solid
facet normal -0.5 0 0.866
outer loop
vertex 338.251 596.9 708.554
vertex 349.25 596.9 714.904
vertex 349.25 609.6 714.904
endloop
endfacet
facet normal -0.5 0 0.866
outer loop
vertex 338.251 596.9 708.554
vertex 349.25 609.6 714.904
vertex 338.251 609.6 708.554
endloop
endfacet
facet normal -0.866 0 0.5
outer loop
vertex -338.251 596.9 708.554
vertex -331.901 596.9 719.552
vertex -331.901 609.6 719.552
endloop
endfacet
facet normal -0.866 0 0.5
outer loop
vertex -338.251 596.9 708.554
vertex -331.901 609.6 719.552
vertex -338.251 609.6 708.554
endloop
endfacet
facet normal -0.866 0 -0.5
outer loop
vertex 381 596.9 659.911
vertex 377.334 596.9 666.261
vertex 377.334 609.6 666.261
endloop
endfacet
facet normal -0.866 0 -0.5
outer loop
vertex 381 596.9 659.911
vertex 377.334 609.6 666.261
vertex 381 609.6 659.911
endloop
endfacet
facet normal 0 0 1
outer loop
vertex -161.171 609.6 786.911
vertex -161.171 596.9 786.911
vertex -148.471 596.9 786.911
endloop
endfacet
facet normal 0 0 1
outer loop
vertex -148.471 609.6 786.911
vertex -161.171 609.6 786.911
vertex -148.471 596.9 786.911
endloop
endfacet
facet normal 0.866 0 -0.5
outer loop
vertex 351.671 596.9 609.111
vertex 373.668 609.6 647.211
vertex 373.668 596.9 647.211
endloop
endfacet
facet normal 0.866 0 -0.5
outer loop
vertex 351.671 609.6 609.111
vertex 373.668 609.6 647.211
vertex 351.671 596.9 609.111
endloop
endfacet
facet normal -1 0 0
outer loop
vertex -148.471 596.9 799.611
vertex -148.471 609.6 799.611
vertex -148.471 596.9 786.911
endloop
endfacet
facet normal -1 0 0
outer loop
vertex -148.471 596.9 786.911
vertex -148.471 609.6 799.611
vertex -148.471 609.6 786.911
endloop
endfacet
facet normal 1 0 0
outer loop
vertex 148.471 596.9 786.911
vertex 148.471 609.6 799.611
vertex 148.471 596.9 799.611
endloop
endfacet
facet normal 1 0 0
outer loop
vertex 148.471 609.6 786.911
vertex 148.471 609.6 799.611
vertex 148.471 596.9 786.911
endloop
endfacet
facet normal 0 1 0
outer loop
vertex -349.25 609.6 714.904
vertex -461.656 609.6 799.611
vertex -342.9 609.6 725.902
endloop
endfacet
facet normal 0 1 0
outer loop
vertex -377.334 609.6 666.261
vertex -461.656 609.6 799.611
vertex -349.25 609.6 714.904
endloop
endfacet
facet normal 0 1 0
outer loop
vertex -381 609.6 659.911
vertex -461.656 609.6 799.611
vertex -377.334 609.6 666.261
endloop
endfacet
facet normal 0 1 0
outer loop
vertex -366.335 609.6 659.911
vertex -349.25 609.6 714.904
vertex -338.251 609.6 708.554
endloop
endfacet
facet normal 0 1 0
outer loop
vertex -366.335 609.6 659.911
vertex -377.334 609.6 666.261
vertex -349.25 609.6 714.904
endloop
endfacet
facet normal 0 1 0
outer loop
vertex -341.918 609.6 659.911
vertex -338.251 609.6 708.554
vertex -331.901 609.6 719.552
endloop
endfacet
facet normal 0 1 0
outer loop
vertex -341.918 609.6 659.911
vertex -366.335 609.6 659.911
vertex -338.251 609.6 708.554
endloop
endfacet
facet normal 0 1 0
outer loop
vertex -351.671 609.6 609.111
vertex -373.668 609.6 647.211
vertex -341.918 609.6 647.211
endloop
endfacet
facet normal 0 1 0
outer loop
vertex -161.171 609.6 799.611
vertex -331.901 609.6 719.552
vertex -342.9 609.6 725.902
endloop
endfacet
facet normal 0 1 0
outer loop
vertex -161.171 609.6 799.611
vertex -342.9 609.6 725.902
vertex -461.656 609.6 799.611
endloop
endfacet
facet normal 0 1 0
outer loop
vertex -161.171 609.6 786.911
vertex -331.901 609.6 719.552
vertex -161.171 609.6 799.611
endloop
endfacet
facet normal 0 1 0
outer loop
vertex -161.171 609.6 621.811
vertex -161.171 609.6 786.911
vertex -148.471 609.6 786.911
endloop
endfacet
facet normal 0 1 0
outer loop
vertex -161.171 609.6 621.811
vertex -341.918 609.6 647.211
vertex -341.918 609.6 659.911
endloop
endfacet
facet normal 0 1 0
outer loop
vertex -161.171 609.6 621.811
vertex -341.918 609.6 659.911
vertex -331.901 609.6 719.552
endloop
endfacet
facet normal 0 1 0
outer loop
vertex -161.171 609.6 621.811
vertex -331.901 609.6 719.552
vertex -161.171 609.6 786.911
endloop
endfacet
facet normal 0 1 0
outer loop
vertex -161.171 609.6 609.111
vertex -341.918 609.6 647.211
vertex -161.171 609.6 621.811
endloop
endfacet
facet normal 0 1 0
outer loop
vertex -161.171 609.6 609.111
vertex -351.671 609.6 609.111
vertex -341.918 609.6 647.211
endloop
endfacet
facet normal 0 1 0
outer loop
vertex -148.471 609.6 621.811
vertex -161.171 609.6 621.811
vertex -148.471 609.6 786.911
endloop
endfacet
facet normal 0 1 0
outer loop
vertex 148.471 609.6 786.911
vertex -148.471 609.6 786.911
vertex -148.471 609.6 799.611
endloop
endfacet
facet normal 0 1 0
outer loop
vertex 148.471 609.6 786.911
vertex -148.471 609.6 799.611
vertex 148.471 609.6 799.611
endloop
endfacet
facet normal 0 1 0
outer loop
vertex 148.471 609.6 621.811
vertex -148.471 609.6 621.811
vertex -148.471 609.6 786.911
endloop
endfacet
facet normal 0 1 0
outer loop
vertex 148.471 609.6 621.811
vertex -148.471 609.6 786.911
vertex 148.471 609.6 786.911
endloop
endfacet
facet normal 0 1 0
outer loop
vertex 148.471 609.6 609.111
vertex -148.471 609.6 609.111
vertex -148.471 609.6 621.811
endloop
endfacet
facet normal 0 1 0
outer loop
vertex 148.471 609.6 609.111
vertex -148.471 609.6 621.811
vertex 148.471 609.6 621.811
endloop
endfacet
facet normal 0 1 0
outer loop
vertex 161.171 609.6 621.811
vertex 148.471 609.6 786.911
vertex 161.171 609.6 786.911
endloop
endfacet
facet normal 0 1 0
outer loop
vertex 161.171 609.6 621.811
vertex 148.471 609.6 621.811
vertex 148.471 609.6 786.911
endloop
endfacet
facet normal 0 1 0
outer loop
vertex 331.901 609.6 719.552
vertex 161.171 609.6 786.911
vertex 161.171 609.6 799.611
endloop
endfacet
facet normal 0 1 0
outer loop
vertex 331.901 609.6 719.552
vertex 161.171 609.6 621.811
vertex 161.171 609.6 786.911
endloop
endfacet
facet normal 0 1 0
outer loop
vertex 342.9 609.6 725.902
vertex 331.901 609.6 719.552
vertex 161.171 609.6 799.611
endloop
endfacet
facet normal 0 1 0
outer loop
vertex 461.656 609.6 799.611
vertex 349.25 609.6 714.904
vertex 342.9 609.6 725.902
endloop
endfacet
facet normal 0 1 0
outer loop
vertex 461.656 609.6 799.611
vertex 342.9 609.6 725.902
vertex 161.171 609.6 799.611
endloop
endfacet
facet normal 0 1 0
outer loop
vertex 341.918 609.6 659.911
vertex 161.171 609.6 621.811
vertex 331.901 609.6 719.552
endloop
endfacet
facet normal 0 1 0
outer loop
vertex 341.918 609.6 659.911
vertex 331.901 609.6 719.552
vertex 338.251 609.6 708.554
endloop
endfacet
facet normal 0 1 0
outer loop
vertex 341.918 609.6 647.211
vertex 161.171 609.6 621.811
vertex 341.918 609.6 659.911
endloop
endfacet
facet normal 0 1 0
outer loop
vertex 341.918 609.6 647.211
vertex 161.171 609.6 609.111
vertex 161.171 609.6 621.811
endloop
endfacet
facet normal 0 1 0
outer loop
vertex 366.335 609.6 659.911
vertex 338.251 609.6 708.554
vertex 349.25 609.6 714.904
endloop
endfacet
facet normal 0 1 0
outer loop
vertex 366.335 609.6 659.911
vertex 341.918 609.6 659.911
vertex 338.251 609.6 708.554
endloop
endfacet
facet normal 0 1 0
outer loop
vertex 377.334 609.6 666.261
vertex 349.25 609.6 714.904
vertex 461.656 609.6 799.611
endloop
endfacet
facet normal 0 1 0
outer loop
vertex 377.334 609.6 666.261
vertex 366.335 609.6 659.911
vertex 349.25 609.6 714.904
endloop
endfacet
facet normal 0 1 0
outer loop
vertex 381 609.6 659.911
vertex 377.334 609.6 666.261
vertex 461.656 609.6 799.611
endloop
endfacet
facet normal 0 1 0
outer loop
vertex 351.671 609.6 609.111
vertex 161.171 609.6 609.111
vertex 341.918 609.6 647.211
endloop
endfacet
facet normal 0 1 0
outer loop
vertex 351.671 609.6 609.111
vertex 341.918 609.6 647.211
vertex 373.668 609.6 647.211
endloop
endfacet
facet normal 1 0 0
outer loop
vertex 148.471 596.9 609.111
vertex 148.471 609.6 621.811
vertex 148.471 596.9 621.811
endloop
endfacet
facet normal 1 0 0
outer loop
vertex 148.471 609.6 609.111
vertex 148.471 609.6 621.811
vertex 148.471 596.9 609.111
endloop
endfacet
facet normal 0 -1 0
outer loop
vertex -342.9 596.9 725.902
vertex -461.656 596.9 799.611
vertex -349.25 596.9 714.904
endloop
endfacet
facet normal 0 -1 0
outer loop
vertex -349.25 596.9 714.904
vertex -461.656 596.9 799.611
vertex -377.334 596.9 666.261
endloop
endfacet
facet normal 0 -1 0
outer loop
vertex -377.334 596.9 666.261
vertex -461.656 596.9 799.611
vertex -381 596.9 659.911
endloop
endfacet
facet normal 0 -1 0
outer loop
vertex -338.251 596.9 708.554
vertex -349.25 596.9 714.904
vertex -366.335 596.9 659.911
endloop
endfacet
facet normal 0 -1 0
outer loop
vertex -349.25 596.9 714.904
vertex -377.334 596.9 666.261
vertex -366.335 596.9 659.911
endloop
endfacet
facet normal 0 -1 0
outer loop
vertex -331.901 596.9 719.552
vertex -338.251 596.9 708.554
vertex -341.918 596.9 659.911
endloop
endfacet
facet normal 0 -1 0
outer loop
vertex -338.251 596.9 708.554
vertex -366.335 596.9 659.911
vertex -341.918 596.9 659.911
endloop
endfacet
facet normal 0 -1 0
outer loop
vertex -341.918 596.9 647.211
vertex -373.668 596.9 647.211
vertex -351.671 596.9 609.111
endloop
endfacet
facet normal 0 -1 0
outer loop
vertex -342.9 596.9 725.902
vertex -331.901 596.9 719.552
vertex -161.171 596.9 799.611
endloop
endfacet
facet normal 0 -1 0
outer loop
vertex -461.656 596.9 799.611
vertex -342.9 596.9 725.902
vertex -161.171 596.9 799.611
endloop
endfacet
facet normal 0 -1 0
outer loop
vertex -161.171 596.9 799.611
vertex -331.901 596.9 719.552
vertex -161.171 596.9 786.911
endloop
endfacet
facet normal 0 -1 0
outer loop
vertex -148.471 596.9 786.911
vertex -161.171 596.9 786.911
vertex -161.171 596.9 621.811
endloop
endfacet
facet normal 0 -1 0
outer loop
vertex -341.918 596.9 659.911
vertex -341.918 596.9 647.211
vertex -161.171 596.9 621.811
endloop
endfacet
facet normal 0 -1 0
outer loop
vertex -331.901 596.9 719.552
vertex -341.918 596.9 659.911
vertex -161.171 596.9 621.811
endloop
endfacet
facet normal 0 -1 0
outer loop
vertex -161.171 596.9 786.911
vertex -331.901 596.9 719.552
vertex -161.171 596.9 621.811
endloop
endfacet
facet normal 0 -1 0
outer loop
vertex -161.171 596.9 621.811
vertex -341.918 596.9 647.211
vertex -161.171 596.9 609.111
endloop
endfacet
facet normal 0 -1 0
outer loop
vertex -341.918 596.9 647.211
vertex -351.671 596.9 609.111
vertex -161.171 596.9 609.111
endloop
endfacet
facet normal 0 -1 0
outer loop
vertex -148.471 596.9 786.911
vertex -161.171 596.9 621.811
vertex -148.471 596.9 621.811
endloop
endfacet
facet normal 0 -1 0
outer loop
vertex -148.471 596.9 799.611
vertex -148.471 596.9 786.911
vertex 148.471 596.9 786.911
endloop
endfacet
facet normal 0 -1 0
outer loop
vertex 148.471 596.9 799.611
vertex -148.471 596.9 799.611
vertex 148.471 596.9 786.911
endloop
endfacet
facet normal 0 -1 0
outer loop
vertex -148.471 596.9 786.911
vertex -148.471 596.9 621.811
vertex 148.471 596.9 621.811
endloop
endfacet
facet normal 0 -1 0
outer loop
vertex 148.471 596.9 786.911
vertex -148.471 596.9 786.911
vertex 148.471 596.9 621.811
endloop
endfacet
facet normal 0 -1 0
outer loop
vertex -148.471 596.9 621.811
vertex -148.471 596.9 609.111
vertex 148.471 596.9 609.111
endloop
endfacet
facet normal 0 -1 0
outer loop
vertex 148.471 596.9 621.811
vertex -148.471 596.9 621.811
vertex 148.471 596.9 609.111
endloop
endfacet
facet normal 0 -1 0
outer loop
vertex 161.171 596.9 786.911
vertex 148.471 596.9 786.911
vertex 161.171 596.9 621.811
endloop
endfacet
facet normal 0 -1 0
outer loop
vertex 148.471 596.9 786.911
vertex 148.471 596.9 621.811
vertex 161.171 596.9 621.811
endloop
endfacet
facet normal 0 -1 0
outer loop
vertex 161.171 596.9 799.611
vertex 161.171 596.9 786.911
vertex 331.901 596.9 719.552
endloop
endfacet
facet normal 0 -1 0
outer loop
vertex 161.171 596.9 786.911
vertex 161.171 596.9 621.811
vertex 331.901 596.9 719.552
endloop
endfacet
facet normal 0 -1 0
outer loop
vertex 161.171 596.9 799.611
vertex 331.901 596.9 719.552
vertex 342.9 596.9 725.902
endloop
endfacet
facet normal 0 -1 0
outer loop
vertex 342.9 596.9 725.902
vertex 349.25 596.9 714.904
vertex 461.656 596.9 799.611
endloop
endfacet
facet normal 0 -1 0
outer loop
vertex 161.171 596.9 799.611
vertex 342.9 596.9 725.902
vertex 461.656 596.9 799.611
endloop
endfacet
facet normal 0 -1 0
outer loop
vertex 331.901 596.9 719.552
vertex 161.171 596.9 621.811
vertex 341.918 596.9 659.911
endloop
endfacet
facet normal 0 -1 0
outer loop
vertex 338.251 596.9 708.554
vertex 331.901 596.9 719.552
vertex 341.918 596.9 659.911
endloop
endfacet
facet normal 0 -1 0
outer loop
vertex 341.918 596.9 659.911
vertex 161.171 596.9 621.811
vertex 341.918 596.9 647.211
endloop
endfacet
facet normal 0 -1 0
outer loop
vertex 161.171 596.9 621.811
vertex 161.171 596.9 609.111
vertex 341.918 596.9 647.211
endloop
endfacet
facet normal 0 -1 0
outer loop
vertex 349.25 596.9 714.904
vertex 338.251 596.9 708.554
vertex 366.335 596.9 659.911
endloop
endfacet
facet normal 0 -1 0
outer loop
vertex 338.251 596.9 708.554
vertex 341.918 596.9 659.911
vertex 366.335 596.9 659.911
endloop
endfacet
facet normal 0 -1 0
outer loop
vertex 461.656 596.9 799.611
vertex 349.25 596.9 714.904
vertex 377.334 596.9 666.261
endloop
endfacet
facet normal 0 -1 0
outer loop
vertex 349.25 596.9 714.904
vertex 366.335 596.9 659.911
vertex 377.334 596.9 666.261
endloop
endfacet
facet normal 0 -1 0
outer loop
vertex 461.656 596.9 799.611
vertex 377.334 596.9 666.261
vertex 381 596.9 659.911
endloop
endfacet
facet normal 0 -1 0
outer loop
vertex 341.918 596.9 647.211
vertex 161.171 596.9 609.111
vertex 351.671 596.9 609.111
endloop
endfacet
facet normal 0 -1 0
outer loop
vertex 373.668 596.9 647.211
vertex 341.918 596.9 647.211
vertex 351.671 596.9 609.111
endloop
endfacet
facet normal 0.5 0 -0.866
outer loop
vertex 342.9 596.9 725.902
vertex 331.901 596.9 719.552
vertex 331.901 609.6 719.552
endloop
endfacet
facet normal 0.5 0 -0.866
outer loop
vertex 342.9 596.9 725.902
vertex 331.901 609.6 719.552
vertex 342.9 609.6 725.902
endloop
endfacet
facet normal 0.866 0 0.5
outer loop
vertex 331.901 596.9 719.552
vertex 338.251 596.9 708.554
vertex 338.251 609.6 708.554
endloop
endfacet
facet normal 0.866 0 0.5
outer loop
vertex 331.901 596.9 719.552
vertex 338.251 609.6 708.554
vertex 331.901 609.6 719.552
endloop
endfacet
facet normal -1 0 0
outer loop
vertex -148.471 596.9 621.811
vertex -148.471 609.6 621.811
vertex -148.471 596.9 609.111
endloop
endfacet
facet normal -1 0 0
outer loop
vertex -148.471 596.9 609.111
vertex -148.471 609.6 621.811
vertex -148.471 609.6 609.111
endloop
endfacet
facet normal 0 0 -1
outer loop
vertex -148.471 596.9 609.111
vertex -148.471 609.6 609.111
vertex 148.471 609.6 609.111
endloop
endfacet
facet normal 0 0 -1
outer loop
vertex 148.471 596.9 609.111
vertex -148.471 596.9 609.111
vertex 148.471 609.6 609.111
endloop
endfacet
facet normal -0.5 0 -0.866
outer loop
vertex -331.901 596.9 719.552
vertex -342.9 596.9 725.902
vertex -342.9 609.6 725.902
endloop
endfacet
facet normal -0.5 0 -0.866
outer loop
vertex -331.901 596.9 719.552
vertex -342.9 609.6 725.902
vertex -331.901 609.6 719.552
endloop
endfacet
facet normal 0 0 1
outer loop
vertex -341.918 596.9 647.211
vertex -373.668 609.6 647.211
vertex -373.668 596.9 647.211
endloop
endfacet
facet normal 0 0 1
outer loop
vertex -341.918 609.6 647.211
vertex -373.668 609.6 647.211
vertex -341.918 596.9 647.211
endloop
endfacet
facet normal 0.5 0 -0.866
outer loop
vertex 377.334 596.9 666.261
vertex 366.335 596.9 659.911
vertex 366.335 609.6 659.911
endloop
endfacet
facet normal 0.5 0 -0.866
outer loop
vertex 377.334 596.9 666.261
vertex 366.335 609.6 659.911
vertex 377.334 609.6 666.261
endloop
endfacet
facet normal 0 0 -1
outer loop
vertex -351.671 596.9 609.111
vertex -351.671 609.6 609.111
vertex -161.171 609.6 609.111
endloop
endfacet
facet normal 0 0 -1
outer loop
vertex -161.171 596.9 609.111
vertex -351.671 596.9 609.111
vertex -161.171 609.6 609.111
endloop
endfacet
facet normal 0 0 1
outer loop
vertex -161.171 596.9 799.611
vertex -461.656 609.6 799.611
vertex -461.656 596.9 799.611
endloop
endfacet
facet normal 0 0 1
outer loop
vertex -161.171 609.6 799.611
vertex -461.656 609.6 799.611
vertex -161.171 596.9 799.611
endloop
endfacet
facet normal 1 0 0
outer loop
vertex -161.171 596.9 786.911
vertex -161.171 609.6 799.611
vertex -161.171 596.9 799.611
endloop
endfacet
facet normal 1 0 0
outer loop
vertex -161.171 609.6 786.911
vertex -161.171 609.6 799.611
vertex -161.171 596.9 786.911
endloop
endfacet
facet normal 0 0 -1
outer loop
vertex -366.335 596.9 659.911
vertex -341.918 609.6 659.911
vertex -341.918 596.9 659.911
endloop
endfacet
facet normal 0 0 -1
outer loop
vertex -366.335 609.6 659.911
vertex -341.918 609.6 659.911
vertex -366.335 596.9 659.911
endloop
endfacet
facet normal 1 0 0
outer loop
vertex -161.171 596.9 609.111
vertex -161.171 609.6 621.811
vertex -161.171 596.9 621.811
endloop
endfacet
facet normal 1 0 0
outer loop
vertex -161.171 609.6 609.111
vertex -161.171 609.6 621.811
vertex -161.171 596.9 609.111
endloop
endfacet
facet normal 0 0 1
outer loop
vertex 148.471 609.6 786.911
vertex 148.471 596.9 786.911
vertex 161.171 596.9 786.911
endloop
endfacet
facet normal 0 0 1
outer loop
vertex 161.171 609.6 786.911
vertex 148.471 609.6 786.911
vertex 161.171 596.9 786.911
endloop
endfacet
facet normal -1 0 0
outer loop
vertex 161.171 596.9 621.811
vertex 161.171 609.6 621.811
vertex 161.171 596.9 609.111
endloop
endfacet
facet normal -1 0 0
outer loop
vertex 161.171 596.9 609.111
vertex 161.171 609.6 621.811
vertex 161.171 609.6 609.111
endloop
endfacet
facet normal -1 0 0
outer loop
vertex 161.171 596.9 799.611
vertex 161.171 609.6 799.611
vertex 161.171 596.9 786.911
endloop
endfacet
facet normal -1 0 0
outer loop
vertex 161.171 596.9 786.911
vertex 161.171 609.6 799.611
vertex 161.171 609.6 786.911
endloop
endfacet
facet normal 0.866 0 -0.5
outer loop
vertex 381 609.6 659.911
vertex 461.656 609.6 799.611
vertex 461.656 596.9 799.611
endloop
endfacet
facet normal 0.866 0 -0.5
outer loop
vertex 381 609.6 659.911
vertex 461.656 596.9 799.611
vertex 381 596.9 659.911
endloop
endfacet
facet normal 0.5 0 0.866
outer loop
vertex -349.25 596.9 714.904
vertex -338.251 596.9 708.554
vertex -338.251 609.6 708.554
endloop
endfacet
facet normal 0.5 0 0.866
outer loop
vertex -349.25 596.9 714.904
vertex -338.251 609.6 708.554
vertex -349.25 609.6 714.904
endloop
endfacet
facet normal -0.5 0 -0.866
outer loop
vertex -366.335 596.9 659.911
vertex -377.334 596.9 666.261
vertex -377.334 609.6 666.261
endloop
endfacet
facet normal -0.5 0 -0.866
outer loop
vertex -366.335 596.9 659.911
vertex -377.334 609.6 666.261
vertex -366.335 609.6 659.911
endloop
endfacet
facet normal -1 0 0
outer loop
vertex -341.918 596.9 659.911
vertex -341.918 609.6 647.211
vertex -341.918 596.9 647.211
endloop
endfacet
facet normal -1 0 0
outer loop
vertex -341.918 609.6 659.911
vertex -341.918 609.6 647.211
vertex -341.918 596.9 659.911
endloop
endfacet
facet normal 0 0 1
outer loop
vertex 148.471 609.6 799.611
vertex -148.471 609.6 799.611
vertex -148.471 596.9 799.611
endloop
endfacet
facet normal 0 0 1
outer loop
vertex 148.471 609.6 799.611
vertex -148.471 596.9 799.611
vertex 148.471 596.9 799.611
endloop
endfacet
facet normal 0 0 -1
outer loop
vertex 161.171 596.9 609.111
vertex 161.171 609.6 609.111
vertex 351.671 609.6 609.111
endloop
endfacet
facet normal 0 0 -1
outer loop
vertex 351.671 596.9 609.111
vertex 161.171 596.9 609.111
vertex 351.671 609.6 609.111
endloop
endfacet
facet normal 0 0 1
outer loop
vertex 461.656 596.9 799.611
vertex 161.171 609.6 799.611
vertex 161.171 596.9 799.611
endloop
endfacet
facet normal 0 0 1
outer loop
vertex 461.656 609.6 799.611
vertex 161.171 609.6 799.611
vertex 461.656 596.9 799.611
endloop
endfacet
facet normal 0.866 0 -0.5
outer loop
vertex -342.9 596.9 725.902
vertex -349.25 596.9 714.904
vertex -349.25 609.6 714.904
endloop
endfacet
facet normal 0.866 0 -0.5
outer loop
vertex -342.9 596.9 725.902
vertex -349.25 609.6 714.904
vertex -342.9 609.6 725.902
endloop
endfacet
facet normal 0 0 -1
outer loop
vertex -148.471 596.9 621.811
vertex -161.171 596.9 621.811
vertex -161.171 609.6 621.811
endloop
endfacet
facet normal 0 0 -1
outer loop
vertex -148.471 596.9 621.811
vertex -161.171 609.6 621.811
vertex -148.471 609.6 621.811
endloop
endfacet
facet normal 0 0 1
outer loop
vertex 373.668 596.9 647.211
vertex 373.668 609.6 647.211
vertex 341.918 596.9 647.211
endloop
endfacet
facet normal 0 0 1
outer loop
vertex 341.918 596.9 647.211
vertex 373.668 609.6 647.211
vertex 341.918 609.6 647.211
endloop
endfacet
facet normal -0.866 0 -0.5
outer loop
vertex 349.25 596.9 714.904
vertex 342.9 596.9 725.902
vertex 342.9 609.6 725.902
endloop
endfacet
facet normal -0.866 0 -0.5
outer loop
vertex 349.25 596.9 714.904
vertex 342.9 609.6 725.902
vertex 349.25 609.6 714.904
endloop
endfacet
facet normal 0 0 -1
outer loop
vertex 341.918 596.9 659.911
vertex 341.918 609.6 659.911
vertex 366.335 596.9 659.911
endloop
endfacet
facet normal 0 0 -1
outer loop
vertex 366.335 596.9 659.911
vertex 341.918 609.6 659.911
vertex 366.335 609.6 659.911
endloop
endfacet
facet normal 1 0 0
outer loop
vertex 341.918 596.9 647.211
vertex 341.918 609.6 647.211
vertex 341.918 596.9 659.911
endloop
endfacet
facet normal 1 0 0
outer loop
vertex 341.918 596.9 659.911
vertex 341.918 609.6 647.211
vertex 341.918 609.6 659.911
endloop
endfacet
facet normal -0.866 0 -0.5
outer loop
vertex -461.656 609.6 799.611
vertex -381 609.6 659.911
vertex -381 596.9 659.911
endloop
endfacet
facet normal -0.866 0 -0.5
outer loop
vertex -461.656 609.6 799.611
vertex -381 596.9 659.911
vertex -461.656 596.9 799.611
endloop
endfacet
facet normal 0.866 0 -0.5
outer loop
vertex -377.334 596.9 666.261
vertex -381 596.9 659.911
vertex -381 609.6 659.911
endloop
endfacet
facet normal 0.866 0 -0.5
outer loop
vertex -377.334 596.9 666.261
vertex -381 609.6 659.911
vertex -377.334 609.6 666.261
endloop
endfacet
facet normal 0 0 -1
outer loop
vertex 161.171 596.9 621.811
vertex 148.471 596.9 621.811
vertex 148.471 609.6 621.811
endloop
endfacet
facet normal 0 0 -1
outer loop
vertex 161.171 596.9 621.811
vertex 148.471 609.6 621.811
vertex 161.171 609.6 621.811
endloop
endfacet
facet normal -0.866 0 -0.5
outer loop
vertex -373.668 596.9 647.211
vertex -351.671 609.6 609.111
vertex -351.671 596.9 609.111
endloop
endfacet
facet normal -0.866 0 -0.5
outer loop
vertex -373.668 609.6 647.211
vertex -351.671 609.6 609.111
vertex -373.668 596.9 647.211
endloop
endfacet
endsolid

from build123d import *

# Parameters (mm, degrees)
BOSS_EXTRUDE1_DEPTH = 12.7
SKETCH2_OUTSIDE_W   = 2337.202
SKETCH2_OUTSIDE_H   = 2089.8
CUT_EXTRUDE1_DEPTH  = 12.7
SKETCH3_W           = 12.7
SKETCH3_H           = 12.7
CUT_EXTRUDE2_DEPTH  = 12.7
CUT_EXTRUDE3_DEPTH  = 12.7


with BuildPart() as part:
    # Sketch1 → Boss-Extrude1 (new body)
    with BuildSketch(Plane(origin=(0, 609.6, 0), x_dir=(1, 0, 0), z_dir=(0, 1, 0))):
        Polygon((923.311665212, 0), (461.655832606, 799.611357684), (-461.655832606, 799.611357684), (-923.311665212, 0), (-461.655832606, -799.611357684), (461.655832606, -799.611357684), align=None)
        Polygon((-351.670606325, 609.111357684), (-703.34121265, 0), (-351.670606325, -609.111357684), (351.670606325, -609.111357684), (703.34121265, 0), (351.670606325, 609.111357684), align=None, mode=Mode.SUBTRACT)
    extrude(amount=-BOSS_EXTRUDE1_DEPTH)

    # Sketch2 outside → Cut-Extrude1 (cut)
    with BuildSketch(Plane(origin=(0, 609.6, 0), x_dir=(1, 0, 0), z_dir=(0, 1, 0))):
        Rectangle(SKETCH2_OUTSIDE_W, SKETCH2_OUTSIDE_H)
        Polygon((-351.670606325, -609.111357684), (-461.655832606, -799.611357684), (461.655832606, -799.611357684), (351.670606325, -609.111357684), align=None, mode=Mode.SUBTRACT)
    extrude(amount=-CUT_EXTRUDE1_DEPTH, mode=Mode.SUBTRACT)

    # Sketch3 → Cut-Extrude2 (cut)
    with BuildSketch(Plane(origin=(0, 609.6, 0), x_dir=(1, 0, 0), z_dir=(0, 1, 0))):
        with Locations((-154.820606325, -615.461357684)):
            Rectangle(SKETCH3_W, SKETCH3_H)
        Polygon((-342.9, -725.902493452), (-331.901477372, -719.552493452), (-338.251477372, -708.553970824), (-349.25, -714.903970824), align=None)
        with Locations((-154.820606325, -793.261357684)):
            Rectangle(SKETCH3_W, SKETCH3_H)
        Polygon((-373.667651581, -647.211357684), (-381, -659.911357684), (-377.333825791, -666.261357684), (-366.335303163, -659.911357684), align=None)
        Polygon((381, -659.911357684), (373.667651581, -647.211357684), (366.335303163, -659.911357684), (377.333825791, -666.261357684), align=None)
        Polygon((338.251477372, -708.553970824), (331.901477372, -719.552493452), (342.9, -725.902493452), (349.25, -714.903970824), align=None)
        with Locations((154.820606325, -615.461357684)):
            Rectangle(SKETCH3_W, SKETCH3_H)
        with Locations((154.820606325, -793.261357684)):
            Rectangle(SKETCH3_W, SKETCH3_H)
    extrude(amount=-CUT_EXTRUDE2_DEPTH, mode=Mode.SUBTRACT)

    # Sketch4 → Cut-Extrude3 (cut)
    with BuildSketch(Plane(origin=(0, 609.6, 0), x_dir=(1, 0, 0), z_dir=(0, 1, 0))):
        Polygon((366.335303163, -659.911357684), (373.667651581, -647.211357684), (341.917651581, -647.211357684), (341.917651581, -659.911357684), align=None)
        Polygon((-373.667651581, -647.211357684), (-341.917651581, -647.211357684), (-341.917651581, -659.911357684), (-366.335303163, -659.911357684), align=None)
    extrude(amount=-CUT_EXTRUDE3_DEPTH, mode=Mode.SUBTRACT)


solid = part.part
